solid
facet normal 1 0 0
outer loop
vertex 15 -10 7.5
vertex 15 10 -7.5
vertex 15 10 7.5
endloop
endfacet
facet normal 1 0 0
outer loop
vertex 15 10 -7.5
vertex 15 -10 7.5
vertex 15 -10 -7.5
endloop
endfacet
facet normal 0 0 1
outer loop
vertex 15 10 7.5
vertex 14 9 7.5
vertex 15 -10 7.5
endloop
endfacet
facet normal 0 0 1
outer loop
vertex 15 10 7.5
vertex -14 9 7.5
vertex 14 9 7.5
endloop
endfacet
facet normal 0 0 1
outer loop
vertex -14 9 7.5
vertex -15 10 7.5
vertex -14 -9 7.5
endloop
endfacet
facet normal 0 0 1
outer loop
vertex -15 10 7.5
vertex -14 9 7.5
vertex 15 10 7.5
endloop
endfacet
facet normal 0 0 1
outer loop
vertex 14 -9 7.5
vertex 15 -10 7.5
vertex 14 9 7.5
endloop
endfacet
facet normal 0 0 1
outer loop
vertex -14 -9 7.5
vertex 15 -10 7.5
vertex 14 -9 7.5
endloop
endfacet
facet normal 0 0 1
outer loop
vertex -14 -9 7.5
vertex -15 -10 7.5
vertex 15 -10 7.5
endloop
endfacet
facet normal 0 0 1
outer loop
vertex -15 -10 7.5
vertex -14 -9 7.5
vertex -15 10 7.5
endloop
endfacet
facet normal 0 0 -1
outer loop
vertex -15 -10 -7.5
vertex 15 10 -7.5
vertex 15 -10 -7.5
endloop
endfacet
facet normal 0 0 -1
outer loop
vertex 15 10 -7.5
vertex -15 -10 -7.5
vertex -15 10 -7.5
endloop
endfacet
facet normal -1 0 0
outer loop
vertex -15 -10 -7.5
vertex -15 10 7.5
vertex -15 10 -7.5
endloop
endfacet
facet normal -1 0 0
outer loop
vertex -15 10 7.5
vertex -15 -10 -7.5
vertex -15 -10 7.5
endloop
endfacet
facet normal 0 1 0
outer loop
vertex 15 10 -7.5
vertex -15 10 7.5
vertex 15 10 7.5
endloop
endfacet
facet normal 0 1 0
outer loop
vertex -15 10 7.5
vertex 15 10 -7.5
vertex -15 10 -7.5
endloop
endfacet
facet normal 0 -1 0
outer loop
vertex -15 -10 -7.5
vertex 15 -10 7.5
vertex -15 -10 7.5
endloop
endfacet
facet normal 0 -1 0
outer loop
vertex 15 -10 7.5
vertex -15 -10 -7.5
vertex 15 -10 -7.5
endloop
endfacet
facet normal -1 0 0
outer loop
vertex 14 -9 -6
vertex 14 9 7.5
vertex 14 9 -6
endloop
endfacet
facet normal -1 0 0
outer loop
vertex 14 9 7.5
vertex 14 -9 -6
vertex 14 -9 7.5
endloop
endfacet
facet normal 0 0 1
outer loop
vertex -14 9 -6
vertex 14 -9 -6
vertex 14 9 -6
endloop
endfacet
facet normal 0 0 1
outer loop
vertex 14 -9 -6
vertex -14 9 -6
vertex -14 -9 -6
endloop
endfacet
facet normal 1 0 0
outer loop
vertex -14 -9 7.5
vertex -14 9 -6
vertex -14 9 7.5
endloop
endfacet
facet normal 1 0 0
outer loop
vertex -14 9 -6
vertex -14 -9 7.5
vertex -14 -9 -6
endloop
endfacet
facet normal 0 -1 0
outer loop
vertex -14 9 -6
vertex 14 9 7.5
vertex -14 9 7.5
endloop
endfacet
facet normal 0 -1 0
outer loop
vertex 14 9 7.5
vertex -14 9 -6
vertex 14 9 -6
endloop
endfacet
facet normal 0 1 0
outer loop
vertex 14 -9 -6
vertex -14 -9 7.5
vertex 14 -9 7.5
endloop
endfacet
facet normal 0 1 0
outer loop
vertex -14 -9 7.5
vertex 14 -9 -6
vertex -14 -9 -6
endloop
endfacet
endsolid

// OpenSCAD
/*union is implicited*/

length = 20;
width = 30;
height = 15;
wall = 1;
difference(){
    //main body to cut 
    cube([width,length,height],center=true);
    
    translate([0,0,wall])
    cube([width-wall*2, length-wall*2, height-wall], center = true);
    }
